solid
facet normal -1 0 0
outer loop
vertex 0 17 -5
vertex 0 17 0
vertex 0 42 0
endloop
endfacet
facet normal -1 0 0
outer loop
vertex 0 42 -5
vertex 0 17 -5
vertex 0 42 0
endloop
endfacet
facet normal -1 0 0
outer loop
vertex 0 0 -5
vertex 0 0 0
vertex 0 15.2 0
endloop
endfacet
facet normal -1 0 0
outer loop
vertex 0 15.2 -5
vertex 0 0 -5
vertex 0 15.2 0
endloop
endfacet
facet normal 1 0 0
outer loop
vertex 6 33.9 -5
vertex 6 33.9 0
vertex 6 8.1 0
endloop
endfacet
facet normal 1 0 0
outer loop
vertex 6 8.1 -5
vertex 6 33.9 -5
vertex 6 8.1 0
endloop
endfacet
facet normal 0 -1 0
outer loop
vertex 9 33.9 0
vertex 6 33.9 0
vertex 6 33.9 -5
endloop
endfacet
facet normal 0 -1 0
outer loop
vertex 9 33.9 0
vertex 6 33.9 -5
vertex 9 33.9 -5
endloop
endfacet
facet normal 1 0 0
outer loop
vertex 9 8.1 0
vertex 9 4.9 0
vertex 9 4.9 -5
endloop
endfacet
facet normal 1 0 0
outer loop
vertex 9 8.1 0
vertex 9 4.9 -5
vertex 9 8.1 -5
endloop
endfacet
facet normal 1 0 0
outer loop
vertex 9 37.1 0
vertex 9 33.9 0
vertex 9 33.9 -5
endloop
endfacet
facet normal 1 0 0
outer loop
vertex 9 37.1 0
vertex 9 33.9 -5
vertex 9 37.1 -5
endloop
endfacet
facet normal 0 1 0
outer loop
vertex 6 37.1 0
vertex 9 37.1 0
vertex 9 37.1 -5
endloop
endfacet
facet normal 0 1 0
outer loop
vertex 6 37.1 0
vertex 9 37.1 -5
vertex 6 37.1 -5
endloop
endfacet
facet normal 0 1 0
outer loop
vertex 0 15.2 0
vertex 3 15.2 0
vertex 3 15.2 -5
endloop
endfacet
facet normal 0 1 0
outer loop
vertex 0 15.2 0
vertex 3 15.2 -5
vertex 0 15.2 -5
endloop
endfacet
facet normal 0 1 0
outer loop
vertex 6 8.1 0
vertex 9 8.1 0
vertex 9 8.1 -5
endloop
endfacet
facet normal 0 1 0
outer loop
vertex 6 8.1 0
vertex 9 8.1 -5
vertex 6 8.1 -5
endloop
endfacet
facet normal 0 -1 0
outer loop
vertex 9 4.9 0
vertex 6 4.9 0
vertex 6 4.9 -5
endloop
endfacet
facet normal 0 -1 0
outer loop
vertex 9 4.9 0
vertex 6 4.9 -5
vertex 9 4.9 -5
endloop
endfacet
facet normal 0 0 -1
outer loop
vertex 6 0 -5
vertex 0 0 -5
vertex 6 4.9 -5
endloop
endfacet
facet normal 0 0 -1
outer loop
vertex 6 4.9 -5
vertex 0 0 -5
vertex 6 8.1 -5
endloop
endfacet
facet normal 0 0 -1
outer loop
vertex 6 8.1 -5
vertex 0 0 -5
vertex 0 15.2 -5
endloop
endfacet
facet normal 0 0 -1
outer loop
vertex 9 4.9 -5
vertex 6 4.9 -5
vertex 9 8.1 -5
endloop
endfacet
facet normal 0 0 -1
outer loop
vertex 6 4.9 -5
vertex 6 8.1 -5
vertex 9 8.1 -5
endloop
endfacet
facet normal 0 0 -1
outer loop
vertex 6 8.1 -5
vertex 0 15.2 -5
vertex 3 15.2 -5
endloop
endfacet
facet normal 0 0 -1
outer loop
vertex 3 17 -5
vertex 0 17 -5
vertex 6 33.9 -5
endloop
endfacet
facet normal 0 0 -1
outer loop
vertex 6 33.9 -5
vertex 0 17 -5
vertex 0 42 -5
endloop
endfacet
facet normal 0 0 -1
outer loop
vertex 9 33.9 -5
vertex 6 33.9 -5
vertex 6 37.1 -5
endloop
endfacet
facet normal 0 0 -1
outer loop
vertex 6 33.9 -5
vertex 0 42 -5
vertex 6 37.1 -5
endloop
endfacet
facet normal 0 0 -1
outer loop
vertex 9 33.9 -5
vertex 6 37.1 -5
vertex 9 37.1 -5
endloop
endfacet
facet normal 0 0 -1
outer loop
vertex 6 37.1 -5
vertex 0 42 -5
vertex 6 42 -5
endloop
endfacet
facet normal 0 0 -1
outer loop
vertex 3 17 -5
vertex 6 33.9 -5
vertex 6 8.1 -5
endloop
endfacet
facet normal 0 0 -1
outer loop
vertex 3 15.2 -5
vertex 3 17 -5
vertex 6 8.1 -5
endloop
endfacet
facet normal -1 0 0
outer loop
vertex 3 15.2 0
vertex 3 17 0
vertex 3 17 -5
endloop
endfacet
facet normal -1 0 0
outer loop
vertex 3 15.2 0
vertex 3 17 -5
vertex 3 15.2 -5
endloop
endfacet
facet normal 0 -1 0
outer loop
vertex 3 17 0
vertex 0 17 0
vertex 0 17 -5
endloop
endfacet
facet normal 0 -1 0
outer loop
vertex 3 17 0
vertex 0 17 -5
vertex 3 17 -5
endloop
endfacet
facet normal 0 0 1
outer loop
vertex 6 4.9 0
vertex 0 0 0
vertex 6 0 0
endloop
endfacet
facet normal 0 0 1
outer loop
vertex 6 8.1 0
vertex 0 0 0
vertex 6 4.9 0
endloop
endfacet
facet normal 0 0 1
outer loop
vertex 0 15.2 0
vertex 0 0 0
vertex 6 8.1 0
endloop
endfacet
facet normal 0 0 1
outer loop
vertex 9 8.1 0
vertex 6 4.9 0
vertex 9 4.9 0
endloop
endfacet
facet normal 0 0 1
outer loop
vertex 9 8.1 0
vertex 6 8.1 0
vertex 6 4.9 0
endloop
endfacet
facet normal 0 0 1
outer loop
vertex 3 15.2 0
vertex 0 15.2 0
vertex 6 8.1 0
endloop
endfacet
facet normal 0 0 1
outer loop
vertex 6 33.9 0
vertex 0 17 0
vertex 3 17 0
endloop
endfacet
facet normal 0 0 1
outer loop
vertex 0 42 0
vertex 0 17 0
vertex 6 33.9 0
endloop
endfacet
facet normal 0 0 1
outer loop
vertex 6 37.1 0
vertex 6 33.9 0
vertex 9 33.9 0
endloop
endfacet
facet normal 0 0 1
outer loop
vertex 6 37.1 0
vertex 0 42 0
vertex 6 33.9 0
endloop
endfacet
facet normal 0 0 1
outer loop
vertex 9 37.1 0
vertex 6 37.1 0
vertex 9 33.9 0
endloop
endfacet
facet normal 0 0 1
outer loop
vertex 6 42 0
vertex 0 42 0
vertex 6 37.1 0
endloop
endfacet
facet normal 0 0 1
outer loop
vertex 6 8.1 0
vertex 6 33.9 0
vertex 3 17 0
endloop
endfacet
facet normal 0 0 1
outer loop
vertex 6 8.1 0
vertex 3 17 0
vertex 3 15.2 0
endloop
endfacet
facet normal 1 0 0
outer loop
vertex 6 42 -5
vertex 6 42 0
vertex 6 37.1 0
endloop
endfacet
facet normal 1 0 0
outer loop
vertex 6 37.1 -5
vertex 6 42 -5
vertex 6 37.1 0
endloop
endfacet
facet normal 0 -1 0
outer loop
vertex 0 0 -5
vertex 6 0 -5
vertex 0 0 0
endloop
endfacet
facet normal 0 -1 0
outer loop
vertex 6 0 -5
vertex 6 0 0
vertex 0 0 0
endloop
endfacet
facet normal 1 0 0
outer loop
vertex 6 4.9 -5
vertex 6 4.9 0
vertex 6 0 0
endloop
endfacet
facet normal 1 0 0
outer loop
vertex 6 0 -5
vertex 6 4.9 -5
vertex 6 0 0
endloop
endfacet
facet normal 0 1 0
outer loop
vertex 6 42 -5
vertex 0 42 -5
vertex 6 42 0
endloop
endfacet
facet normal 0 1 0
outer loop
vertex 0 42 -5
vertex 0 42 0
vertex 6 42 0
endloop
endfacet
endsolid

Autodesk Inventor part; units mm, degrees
ref_plane "YZ Plane" through (0, 0, 0) normal (1, 0, 0) x (0, 1, 0)
ref_plane "XZ Plane" through (0, 0, 0) normal (0, 1, 0) x (-1, 0, 0)
ref_plane "XY Plane" through (0, 0, 0) normal (0, 0, 1) x (1, 0, 0)
sketch "Sketch1" plane through (0, 0, 0) normal (0, 0, 1) x (1, 0, 0)
  line L0 (0, 42) -> (6, 42)
  line L1 (6, 42) -> (6, 0)
  line L2 (6, 0) -> (0, 0)
  line L3 (0, 0) -> (0, 42)
  dimension "d0" = 6
  dimension "d1" = 42
extrude "Extrusion1" add sketch "Sketch1" against normal blind 5
sketch "Sketch4" plane through (0, 0, 0) normal (0, 0, 1) x (1, 0, 0)
  line L0 (0, 0) -> (0, 42) projected
  line L1 (0, 17) -> (3, 17)
  line L2 (3, 17) -> (3, 15.2)
  line L3 (3, 15.2) -> (0, 15.2)
  line L4 (0, 15.2) -> (0, 17)
  line L5 (6, 0) -> (0, 0) projected
  point P0 (0, 45)
  dimension "d12" = 1.8
  dimension "d13" = 3
  dimension "d18" = 17
extrude "Extrusion4" cut sketch "Sketch4" against normal blind 5
sketch "Sketch5" plane through (0, 0, 0) normal (0, 0, 1) x (1, 0, 0)
  line L0 (6, 42) -> (6, 0) projected
  line L1 (6, 0) -> (0, 0) projected
  line L2 (0, 42) -> (6, 42) projected
  line L3 (6, 42) -> (6, 0) projected
  line L4 (9, 8.1) -> (6, 8.1)
  line L5 (6, 8.1) -> (6, 4.9)
  line L6 (6, 4.9) -> (9, 4.9)
  line L7 (9, 4.9) -> (9, 8.1)
  line L8 (9, 8.1) -> (6, 4.9) construction
  line L9 (6, 8.1) -> (9, 4.9) construction
  line L10 (9, 37.1) -> (6, 37.1)
  line L11 (6, 37.1) -> (6, 33.9)
  line L12 (6, 33.9) -> (9, 33.9)
  line L13 (9, 33.9) -> (9, 37.1)
  line L14 (9, 37.1) -> (6, 33.9) construction
  line L15 (6, 37.1) -> (9, 33.9) construction
  line L16 (0, 42) -> (6, 0) construction
  line L17 (0, 0) -> (6, 42) construction
  point P0 (7.5, 6.5)
  point P1 (7.5, 35.5)
  point P2 (3, 21)
  dimension "d31" = 3
  dimension "d32" = 3.2
  dimension "d34" = 14.5
  dimension "d35" = 14.5
  dimension "d36" = 3.2
extrude "Extrusion5" add sketch "Sketch5" against normal blind 5
equation "\"d35\" = d34"
equation "\"d36\" = d32"
equation "\"kerf\" = 0.15"
properties part number "PCBSupport"
